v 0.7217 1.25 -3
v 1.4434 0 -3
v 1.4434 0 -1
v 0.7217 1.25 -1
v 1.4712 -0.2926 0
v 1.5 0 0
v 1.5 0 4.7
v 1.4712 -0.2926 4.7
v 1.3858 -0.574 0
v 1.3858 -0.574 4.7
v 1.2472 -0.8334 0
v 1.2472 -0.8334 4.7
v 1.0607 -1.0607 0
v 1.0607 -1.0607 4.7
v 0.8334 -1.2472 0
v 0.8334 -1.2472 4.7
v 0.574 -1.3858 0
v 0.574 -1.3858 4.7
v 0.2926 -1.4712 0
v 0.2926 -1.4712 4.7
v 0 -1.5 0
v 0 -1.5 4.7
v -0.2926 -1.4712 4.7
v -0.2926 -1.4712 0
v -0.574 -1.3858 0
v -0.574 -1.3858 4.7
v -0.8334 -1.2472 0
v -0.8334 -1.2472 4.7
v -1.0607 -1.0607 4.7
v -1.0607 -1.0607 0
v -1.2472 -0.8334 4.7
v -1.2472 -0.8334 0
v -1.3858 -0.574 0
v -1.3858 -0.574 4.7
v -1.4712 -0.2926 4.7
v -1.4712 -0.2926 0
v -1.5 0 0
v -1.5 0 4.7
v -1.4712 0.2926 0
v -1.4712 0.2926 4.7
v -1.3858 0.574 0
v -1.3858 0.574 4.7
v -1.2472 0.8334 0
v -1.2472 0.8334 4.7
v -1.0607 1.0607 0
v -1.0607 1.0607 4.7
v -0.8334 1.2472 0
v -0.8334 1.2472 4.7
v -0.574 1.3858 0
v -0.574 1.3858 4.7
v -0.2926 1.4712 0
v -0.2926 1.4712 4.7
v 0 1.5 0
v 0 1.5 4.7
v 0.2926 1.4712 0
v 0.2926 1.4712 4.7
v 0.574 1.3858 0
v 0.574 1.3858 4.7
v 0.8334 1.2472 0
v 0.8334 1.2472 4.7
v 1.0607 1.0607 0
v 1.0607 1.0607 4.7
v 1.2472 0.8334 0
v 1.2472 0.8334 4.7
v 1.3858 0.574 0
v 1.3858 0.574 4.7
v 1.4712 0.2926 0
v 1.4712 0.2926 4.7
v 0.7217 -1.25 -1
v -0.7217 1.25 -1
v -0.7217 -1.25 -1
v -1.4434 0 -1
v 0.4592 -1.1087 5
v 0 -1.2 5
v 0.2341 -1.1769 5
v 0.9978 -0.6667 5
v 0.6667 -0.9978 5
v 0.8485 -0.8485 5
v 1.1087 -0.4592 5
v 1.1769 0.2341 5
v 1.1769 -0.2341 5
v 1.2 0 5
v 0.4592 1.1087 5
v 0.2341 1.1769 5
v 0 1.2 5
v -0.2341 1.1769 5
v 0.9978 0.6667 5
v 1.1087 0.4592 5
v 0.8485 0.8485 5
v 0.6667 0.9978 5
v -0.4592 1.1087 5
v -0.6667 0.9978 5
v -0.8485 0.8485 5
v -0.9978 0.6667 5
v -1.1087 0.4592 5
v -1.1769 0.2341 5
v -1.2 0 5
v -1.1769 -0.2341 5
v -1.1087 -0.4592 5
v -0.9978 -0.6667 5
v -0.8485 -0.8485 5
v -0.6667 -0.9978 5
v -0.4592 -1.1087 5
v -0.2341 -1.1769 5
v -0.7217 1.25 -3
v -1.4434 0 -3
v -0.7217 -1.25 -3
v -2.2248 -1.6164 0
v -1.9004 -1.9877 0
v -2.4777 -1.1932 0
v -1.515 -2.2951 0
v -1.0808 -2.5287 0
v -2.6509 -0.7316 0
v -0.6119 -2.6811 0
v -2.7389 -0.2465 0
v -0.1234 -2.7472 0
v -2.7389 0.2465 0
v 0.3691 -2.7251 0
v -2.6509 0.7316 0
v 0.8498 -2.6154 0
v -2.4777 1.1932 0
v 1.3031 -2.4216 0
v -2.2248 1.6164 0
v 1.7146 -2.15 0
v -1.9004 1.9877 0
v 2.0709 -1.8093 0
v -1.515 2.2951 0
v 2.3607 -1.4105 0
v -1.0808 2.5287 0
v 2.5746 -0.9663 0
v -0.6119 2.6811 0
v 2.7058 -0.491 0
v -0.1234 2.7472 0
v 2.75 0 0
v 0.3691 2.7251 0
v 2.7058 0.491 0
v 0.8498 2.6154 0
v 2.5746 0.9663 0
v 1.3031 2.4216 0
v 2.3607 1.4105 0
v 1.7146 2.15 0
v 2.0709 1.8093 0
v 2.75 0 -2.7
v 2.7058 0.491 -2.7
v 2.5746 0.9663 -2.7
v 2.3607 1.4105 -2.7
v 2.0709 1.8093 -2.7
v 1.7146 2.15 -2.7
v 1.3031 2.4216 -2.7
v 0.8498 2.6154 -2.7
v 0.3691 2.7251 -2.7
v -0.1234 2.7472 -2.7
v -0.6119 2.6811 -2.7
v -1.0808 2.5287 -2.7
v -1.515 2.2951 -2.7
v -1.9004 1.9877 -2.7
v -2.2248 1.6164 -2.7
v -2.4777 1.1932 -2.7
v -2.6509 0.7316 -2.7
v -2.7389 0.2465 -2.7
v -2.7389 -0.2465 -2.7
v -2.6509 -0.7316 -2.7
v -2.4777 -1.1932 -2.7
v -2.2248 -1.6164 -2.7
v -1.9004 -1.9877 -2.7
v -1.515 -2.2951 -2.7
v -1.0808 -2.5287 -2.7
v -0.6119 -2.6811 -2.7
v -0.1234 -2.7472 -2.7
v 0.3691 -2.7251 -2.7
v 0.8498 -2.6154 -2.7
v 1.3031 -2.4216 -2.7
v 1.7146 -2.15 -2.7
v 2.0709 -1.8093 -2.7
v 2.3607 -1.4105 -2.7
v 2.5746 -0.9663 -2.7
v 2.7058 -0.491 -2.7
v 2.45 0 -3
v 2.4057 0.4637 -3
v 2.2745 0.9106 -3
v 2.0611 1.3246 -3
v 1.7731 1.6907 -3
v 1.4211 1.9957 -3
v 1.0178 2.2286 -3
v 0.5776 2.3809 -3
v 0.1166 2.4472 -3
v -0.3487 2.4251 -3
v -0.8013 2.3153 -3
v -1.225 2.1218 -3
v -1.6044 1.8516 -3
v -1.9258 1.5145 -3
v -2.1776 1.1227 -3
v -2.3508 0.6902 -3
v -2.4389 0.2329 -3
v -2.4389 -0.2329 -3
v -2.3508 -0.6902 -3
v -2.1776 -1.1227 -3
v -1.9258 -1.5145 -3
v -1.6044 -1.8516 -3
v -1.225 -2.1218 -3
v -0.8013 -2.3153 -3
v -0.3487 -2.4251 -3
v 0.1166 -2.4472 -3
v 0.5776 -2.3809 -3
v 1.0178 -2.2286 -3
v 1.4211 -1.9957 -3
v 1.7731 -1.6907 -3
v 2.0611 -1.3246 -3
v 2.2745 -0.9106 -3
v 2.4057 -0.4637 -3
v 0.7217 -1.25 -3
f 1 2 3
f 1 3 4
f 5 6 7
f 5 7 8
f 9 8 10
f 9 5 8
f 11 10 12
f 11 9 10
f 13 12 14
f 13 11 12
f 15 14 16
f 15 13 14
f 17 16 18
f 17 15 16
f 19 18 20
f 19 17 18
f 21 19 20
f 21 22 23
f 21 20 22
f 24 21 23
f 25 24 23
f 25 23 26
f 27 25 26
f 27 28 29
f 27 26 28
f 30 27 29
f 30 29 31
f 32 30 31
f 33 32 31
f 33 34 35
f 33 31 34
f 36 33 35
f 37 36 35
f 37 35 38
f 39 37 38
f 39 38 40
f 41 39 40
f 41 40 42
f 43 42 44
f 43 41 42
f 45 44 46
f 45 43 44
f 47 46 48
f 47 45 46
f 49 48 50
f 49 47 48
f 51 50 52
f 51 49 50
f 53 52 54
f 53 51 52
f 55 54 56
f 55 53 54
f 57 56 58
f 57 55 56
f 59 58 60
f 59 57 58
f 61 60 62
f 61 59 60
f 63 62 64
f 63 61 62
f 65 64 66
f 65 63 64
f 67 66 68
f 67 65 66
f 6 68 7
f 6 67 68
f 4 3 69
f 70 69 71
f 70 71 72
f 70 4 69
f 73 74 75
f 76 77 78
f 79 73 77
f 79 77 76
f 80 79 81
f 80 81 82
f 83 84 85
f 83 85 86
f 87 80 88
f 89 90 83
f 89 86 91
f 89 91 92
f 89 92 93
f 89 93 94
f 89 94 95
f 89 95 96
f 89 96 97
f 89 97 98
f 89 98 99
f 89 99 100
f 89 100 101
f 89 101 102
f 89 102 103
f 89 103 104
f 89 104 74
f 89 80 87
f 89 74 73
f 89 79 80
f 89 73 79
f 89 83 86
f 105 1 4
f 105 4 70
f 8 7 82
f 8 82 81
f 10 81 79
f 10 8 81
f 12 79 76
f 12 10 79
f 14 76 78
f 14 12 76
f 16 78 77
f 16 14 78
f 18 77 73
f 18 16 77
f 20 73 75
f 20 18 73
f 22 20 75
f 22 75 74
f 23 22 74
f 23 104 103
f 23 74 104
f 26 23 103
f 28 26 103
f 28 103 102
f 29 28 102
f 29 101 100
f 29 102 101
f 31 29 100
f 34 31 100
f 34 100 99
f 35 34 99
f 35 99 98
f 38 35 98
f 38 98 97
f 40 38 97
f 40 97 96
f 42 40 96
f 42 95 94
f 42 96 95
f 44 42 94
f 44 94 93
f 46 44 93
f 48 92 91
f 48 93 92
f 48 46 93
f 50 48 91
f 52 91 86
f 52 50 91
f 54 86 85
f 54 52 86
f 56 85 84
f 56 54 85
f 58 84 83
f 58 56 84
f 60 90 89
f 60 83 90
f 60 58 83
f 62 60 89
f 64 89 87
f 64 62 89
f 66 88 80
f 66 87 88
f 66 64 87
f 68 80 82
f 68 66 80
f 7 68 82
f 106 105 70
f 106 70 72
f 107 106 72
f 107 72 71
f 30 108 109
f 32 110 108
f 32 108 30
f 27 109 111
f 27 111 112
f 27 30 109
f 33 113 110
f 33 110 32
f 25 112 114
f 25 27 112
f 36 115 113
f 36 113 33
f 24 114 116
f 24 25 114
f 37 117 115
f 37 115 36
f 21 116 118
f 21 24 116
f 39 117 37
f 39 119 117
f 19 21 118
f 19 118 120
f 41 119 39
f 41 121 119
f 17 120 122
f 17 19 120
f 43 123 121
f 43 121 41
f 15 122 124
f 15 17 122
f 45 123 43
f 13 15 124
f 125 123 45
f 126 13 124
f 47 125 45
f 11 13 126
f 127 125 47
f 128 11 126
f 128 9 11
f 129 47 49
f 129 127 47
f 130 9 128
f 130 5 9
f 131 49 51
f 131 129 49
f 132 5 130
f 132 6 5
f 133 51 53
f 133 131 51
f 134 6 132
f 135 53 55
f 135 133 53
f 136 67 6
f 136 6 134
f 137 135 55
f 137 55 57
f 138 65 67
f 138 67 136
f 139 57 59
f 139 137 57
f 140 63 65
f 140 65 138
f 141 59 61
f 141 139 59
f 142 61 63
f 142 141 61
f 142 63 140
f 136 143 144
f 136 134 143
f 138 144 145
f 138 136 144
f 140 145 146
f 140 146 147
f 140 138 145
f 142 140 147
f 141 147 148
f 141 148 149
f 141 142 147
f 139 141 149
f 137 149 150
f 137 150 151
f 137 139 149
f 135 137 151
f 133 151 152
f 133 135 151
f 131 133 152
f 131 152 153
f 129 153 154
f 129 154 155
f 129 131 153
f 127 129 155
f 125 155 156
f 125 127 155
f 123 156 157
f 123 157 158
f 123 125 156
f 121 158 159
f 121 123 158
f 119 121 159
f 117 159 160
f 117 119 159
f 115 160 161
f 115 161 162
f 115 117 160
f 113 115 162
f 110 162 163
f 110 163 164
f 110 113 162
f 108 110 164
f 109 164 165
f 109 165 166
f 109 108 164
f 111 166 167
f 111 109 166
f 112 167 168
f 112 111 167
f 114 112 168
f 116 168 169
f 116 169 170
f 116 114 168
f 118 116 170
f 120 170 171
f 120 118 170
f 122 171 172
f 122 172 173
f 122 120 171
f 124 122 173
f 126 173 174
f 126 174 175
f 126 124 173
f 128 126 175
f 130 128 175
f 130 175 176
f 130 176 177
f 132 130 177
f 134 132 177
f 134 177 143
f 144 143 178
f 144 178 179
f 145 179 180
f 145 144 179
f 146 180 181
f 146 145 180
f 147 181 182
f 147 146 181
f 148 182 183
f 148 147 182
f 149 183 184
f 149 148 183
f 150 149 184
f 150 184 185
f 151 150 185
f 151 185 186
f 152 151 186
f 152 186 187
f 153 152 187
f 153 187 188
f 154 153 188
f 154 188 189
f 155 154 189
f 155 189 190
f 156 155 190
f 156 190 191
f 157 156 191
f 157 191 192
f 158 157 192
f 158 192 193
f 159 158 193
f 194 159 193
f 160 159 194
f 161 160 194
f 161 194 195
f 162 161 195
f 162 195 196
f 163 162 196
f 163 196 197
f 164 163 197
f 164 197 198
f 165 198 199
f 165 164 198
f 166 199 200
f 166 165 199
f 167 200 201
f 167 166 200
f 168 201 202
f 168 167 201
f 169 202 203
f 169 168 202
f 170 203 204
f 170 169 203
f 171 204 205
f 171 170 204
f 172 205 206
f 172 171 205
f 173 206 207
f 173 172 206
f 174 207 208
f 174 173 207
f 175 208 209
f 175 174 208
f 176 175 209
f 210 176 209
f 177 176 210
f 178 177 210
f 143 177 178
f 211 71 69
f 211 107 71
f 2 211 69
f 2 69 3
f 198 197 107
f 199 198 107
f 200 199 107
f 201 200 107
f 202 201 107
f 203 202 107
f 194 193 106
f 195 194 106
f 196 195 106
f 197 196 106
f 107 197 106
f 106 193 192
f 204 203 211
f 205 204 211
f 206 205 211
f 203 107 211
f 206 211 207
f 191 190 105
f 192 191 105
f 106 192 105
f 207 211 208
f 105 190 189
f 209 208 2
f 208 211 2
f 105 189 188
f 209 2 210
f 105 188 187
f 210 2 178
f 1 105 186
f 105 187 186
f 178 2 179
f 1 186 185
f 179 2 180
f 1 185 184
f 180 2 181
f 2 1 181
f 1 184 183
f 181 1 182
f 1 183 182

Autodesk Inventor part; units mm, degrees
ref_plane "YZ Plane" through (0, 0, 0) normal (1, 0, 0) x (0, 1, 0)
ref_plane "XZ Plane" through (0, 0, 0) normal (0, 1, 0) x (-1, 0, 0)
ref_plane "XY Plane" through (0, 0, 0) normal (0, 0, 1) x (1, 0, 0)
sketch "Sketch1" plane through (0, 0, 0) normal (0, 0, 1) x (1, 0, 0)
  circle A0 centre (0, 0) radius 2.75
  dimension "d0" = 5.5
extrude "Extrusion1" add sketch "Sketch1" against normal blind 3
sketch "Sketch2" plane through (0, 0, 0) normal (0, 0, 1) x (1, 0, 0)
  circle A0 centre (0, 0) radius 1.5
  dimension "d3" = 3
extrude "Extrusion2" add sketch "Sketch2" along normal blind 5
chamfer "Chamfer1" distance 0.3 angle 45 2 edges at (-2.75, 0, -3) (-1.5, 0, 5)
sketch "Sketch3" plane through (0, 0, -3) normal (0, 0, -1) x (-1, 0, 0)
  line L0 (-0.7217, -1.25) -> (-1.4434, 0)
  line L1 (-1.4434, 0) -> (-0.7217, 1.25)
  line L2 (-0.7217, 1.25) -> (0.7217, 1.25)
  line L3 (0.7217, 1.25) -> (1.4434, 0)
  line L4 (1.4434, 0) -> (0.7217, -1.25)
  line L5 (0.7217, -1.25) -> (-0.7217, -1.25)
  point P0 (0, 0)
  point P1 (0, 0)
  dimension "d9" = 2.5
extrude "Extrusion3" cut sketch "Sketch3" against normal blind 2
properties part number "socket_head_cap_screw_M3x5"
